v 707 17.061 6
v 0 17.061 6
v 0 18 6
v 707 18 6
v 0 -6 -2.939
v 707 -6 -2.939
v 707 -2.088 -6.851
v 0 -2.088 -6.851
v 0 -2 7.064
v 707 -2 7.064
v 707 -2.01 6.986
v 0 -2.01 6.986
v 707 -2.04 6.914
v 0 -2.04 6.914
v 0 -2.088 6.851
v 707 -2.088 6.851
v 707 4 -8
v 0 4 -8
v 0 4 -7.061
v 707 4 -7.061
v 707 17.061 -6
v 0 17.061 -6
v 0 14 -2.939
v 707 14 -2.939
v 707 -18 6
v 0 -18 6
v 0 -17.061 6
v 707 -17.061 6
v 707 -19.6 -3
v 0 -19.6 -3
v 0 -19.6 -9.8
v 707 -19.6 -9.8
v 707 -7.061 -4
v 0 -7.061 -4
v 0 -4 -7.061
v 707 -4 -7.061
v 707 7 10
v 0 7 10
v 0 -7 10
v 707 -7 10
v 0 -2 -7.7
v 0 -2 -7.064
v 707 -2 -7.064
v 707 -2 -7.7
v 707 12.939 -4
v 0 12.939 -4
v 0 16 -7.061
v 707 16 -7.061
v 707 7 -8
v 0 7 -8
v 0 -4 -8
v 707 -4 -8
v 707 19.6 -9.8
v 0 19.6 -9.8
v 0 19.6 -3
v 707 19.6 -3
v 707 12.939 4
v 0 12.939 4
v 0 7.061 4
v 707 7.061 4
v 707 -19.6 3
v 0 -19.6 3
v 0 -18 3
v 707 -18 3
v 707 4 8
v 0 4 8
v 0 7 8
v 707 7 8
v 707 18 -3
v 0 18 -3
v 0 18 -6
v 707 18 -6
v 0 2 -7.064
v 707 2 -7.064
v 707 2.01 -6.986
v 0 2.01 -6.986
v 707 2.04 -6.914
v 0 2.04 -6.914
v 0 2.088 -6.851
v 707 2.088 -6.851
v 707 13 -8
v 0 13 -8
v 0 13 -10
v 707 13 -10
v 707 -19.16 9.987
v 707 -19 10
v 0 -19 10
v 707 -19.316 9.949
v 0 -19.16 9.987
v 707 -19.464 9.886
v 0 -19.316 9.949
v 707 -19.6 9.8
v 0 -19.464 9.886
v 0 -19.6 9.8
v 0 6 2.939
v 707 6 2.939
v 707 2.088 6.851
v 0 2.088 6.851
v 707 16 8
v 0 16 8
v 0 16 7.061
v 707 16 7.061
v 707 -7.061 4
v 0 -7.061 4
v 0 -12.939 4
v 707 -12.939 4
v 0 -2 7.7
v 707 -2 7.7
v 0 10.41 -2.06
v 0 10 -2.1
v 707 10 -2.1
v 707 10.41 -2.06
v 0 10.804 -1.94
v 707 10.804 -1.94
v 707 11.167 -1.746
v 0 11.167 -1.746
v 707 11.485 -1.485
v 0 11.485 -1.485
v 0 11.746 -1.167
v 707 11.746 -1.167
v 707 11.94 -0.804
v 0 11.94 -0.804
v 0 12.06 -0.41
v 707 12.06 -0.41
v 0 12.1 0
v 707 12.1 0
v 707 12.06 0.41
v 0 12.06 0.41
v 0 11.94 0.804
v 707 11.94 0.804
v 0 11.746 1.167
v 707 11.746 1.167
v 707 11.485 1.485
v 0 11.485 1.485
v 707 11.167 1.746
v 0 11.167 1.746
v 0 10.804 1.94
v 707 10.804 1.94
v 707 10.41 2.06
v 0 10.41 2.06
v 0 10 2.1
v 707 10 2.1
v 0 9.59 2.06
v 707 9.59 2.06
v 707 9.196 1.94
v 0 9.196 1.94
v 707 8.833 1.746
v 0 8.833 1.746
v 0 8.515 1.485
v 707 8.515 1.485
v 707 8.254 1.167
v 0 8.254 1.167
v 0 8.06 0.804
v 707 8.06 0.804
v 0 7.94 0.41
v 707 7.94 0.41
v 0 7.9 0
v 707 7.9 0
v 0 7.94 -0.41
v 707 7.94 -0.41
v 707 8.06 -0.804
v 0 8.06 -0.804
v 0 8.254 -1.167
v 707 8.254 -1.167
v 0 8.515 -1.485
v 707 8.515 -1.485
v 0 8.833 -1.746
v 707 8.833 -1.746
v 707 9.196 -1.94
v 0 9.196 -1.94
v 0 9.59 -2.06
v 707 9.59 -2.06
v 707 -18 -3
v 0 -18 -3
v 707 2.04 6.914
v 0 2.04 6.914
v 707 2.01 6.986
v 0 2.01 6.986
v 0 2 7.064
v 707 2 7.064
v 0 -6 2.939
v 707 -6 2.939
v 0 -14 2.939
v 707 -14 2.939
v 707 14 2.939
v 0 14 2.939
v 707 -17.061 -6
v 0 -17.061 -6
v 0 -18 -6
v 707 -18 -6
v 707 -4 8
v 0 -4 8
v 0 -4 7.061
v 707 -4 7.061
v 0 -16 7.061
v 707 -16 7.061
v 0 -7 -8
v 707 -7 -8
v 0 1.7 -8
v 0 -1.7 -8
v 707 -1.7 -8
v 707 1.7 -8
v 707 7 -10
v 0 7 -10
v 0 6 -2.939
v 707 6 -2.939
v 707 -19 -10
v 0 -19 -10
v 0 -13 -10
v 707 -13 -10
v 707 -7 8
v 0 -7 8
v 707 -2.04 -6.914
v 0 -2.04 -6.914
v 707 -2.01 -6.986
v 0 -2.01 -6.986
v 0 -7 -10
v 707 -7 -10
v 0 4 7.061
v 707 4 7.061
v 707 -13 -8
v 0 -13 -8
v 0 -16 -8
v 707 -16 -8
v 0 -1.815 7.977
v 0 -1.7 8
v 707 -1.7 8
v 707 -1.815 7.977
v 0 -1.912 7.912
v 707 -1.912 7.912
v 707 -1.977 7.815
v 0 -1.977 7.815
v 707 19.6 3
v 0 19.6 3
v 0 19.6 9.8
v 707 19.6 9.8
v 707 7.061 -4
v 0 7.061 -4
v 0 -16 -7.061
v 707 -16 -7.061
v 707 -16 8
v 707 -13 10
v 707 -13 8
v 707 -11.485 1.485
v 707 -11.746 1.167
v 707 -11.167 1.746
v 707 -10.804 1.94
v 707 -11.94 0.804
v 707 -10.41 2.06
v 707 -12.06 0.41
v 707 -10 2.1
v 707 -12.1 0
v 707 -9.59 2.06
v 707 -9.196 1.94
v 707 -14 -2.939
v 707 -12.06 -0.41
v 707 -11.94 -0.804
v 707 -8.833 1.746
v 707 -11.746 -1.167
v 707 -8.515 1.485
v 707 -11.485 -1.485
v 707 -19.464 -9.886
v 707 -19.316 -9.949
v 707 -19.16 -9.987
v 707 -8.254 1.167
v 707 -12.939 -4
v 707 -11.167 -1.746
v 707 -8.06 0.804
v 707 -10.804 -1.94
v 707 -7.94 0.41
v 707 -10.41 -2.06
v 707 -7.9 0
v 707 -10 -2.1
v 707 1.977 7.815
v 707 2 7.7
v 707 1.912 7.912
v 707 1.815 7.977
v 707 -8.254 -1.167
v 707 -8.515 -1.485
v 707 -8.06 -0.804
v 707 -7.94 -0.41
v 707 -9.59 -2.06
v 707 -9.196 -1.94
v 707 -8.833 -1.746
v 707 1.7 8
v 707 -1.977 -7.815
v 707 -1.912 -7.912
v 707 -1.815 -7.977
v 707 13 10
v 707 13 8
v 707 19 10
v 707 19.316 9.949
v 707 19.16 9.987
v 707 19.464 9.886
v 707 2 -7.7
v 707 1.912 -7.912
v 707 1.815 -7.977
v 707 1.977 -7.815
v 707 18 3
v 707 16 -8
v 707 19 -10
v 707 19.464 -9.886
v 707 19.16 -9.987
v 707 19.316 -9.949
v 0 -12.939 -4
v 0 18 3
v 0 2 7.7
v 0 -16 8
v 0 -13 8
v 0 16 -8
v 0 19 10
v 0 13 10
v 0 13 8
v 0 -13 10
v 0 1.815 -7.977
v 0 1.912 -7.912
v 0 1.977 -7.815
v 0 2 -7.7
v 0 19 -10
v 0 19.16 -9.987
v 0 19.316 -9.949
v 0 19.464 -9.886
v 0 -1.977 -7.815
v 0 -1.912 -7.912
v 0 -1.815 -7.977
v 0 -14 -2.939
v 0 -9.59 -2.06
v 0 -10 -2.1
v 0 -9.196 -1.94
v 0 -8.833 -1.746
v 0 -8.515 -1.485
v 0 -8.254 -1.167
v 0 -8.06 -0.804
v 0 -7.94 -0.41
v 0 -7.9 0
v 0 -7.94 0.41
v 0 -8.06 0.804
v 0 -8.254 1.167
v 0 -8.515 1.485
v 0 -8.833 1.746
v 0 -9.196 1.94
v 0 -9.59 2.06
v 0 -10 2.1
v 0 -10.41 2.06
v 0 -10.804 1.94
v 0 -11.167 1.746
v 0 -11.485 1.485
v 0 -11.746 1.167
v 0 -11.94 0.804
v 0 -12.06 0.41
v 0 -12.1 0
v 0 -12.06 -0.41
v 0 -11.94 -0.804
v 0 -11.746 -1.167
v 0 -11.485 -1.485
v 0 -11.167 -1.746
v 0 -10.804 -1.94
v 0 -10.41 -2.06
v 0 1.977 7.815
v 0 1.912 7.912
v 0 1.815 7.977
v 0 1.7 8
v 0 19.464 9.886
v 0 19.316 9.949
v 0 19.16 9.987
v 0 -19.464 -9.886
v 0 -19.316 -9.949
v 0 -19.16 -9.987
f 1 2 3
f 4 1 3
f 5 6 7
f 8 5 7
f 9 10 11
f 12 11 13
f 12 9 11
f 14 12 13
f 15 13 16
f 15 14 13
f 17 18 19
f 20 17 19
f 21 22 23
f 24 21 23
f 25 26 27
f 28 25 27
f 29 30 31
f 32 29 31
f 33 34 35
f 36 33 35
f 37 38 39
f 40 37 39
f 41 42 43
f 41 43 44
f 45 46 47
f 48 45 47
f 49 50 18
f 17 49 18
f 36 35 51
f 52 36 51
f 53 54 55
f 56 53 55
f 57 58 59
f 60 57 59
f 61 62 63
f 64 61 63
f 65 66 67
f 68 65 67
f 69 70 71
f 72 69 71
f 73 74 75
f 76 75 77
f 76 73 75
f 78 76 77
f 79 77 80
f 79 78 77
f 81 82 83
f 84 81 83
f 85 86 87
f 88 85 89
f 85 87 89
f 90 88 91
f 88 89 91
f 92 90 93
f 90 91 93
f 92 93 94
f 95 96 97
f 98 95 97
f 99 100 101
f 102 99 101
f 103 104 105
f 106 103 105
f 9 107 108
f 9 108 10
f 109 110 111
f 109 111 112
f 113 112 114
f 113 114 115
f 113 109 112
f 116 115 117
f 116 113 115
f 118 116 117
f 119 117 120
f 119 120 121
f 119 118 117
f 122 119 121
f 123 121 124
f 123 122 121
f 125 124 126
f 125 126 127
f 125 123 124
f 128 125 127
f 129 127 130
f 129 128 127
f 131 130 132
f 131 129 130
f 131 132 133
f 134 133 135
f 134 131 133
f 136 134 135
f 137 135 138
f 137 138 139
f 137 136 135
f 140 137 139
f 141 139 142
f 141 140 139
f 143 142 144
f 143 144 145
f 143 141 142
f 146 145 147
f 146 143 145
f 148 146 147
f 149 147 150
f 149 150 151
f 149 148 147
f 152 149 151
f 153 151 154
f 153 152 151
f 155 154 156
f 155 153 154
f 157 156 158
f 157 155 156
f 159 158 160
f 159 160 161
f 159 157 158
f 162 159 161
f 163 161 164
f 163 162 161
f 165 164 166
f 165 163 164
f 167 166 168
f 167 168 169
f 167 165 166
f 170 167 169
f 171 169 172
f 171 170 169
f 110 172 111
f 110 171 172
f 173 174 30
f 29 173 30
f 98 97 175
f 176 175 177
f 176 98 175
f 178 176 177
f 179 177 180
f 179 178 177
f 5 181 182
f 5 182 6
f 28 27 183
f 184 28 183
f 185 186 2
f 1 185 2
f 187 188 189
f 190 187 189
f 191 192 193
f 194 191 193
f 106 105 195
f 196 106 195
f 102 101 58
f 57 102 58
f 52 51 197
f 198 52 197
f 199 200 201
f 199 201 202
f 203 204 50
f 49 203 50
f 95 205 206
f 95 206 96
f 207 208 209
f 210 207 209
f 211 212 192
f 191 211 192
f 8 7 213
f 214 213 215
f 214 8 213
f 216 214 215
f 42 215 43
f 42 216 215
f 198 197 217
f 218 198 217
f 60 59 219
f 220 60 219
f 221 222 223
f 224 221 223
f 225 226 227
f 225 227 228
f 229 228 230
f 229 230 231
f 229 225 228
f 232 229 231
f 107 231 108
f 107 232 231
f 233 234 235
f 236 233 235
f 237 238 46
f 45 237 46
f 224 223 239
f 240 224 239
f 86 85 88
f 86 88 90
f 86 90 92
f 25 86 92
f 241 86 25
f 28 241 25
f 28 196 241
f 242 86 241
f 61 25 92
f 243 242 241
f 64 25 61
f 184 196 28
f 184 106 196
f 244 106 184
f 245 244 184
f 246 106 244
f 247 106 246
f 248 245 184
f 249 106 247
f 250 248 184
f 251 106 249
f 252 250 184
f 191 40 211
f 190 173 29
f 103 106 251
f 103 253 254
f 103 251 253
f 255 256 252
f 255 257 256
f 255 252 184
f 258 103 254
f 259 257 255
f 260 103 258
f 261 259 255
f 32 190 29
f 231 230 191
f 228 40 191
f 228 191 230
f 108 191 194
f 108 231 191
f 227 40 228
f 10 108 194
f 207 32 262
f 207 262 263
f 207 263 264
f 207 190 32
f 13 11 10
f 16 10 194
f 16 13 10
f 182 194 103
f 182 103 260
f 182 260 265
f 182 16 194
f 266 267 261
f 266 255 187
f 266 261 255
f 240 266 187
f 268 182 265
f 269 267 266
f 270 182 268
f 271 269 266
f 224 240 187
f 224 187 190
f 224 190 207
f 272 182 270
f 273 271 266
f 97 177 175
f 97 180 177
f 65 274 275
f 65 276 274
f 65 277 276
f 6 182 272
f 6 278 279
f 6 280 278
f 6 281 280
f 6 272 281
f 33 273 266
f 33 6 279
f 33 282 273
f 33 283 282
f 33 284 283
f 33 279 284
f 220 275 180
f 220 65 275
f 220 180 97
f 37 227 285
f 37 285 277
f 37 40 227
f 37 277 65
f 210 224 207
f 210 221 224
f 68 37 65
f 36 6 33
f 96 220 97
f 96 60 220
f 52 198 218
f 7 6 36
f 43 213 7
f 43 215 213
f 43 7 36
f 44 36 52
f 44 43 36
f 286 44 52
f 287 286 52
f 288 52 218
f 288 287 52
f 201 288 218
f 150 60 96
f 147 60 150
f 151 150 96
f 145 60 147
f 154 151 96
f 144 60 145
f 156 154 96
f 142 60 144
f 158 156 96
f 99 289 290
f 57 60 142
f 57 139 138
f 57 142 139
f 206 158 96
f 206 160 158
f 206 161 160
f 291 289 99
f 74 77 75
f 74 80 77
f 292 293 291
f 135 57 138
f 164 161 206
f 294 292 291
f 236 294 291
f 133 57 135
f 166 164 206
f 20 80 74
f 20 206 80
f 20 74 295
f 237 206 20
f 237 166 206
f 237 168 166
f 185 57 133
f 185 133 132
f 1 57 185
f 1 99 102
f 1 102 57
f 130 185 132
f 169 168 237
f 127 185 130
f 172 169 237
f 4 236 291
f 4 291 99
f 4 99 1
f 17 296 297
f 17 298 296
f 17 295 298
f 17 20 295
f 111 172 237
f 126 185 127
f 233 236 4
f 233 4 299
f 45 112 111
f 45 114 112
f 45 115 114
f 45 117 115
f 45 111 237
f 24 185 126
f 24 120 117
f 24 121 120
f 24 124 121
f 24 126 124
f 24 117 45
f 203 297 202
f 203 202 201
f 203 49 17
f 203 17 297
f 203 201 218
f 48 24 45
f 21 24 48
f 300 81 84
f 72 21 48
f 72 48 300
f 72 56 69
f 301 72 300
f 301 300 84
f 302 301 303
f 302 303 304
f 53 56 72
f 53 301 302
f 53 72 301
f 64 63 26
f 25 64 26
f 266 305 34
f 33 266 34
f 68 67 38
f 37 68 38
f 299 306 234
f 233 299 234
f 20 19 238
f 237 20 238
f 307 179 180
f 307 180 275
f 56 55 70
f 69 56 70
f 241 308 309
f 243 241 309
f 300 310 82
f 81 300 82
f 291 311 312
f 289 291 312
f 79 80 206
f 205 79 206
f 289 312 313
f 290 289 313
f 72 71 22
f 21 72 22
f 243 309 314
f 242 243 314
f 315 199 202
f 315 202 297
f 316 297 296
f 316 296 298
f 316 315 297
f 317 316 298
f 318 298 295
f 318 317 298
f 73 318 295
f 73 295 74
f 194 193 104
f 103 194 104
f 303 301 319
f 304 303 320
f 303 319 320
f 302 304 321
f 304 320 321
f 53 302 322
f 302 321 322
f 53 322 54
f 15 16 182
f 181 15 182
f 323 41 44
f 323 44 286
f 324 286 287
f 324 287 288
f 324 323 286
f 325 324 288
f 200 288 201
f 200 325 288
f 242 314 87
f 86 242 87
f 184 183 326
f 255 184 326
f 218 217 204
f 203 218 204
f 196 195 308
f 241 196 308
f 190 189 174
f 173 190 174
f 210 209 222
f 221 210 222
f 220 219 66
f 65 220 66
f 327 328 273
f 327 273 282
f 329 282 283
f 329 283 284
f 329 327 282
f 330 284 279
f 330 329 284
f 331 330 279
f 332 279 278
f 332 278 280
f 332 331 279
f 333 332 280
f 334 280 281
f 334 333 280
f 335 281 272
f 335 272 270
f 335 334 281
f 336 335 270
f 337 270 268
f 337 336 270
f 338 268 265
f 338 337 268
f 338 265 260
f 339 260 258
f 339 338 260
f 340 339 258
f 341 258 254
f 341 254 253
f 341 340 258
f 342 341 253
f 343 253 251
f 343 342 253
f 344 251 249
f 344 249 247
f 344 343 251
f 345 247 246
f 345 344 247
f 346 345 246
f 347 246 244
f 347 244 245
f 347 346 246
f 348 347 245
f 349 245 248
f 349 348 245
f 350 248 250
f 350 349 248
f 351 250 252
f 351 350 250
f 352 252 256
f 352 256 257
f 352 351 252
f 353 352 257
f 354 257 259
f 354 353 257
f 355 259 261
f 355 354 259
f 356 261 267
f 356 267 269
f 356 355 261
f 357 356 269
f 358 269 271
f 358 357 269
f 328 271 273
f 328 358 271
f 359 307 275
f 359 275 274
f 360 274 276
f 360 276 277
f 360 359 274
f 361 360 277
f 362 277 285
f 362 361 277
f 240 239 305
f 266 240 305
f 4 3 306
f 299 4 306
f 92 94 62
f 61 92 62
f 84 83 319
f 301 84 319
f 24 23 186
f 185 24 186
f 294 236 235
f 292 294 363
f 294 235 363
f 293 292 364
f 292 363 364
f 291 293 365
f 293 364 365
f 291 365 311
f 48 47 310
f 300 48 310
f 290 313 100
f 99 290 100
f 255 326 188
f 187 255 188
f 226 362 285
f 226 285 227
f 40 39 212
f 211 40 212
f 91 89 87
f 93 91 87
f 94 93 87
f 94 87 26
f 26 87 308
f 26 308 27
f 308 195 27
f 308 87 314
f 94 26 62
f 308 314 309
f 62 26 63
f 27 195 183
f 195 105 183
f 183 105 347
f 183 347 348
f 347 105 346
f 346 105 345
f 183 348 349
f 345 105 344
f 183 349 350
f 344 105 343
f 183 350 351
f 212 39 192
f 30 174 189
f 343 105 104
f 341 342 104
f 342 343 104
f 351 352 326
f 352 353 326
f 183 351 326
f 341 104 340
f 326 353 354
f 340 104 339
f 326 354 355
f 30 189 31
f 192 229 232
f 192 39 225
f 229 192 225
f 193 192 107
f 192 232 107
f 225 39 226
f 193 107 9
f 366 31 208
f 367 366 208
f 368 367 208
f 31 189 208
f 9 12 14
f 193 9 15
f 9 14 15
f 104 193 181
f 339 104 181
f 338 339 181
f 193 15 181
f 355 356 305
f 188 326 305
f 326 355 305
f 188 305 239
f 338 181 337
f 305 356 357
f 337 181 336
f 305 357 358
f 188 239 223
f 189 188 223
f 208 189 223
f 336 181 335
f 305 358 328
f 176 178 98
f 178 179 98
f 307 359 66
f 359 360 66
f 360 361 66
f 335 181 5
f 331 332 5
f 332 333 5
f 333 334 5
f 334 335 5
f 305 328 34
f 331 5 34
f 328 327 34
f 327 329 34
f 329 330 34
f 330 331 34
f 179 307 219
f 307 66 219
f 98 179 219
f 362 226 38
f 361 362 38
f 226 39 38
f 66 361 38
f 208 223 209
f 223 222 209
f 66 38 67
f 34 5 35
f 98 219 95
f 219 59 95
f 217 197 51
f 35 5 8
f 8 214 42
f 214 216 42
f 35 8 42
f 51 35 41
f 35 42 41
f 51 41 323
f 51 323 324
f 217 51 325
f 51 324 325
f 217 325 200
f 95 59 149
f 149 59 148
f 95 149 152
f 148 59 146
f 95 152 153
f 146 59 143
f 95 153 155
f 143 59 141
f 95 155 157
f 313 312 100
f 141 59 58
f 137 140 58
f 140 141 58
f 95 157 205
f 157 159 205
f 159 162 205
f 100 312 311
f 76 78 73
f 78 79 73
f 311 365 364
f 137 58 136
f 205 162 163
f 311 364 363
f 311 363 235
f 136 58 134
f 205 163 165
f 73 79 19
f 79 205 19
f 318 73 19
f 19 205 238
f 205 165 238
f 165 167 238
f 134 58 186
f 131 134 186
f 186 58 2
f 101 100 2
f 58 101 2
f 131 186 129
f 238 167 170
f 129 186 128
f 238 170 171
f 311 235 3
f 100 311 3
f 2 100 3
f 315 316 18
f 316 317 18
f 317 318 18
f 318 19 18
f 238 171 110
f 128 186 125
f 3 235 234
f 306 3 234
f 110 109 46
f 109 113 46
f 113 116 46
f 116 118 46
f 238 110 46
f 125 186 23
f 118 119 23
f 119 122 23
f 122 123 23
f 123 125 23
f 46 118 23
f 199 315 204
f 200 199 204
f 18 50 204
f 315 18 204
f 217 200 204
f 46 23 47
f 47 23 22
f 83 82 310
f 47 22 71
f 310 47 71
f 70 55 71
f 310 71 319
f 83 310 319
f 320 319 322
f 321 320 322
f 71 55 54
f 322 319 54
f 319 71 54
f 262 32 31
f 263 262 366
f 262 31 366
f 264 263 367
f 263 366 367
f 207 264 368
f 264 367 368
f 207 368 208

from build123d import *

# Parameters (mm, degrees)
SKETCH1_R           = 2.1
BOSS_EXTRUDE1_DEPTH = 707


with BuildPart() as part:
    # Sketch1 → Boss-Extrude1 (new body)
    with BuildSketch(Plane(origin=(0, 0, 0), x_dir=(0, 0, -1), z_dir=(1, 0, 0))):
        with BuildLine():
            Line((-10, 7), (-10, -7))
            Line((-10, -7), (-8, -7))
            Line((-8, -7), (-8, -4))
            Line((-8, -4), (-7.060660172, -4))
            Line((-7.060660172, -4), (-4, -7.060660172))
            Line((-4, -7.060660172), (-4, -12.939339828))
            Line((-4, -12.939339828), (-7.060660172, -16))
            Line((-7.060660172, -16), (-8, -16))
            Line((-8, -16), (-8, -13))
            Line((-8, -13), (-10, -13))
            Line((-10, -13), (-10, -19))
            ThreePointArc((-10, -19), (-9.948683298, -19.316227766), (-9.8, -19.6))
            Line((-9.8, -19.6), (-3, -19.6))
            Line((-3, -19.6), (-3, -18))
            Line((-3, -18), (-6, -18))
            Line((-6, -18), (-6, -17.060660172))
            Line((-6, -17.060660172), (-2.939339828, -14))
            Line((-2.939339828, -14), (2.939339828, -14))
            Line((2.939339828, -14), (6, -17.060660172))
            Line((6, -17.060660172), (6, -18))
            Line((6, -18), (3, -18))
            Line((3, -18), (3, -19.6))
            Line((3, -19.6), (9.8, -19.6))
            ThreePointArc((9.8, -19.6), (9.948683298, -19.316227766), (10, -19))
            Line((10, -19), (10, -13))
            Line((10, -13), (8, -13))
            Line((8, -13), (8, -16))
            Line((8, -16), (7.060660172, -16))
            Line((7.060660172, -16), (4, -12.939339828))
            Line((4, -12.939339828), (4, -7.060660172))
            Line((4, -7.060660172), (7.060660172, -4))
            Line((7.060660172, -4), (8, -4))
            Line((8, -4), (8, -7))
            Line((8, -7), (10, -7))
            Line((10, -7), (10, 7))
            Line((10, 7), (8, 7))
            Line((8, 7), (8, 4))
            Line((8, 4), (7.060660172, 4))
            Line((7.060660172, 4), (4, 7.060660172))
            Line((4, 7.060660172), (4, 12.939339828))
            Line((4, 12.939339828), (7.060660172, 16))
            Line((7.060660172, 16), (8, 16))
            Line((8, 16), (8, 13))
            Line((8, 13), (10, 13))
            Line((10, 13), (10, 19))
            ThreePointArc((10, 19), (9.948683298, 19.316227766), (9.8, 19.6))
            Line((9.8, 19.6), (3, 19.6))
            Line((3, 19.6), (3, 18))
            Line((3, 18), (6, 18))
            Line((6, 18), (6, 17.060660172))
            Line((6, 17.060660172), (2.939339828, 14))
            Line((2.939339828, 14), (-2.939339828, 14))
            Line((-2.939339828, 14), (-6, 17.060660172))
            Line((-6, 17.060660172), (-6, 18))
            Line((-6, 18), (-3, 18))
            Line((-3, 18), (-3, 19.6))
            Line((-3, 19.6), (-9.8, 19.6))
            ThreePointArc((-9.8, 19.6), (-9.948683298, 19.316227766), (-10, 19))
            Line((-10, 19), (-10, 13))
            Line((-10, 13), (-8, 13))
            Line((-8, 13), (-8, 16))
            Line((-8, 16), (-7.060660172, 16))
            Line((-7.060660172, 16), (-4, 12.939339828))
            Line((-4, 12.939339828), (-4, 7.060660172))
            Line((-4, 7.060660172), (-7.060660172, 4))
            Line((-7.060660172, 4), (-8, 4))
            Line((-8, 4), (-8, 7))
            Line((-8, 7), (-10, 7))
        make_face()
        with Locations((0, 10)):
            Circle(SKETCH1_R, mode=Mode.SUBTRACT)
        with Locations((0, -10)):
            Circle(SKETCH1_R, mode=Mode.SUBTRACT)
        with BuildLine():
            Line((-8, 1.7), (-8, -1.7))
            ThreePointArc((-8, -1.7), (-7.912132034, -1.912132034), (-7.7, -2))
            Line((-7.7, -2), (-7.063603897, -2))
            ThreePointArc((-7.063603897, -2), (-6.948798867, -2.02283614), (-6.851471863, -2.087867966))
            Line((-6.851471863, -2.087867966), (-2.939339828, -6))
            Line((-2.939339828, -6), (2.939339828, -6))
            Line((2.939339828, -6), (6.851471863, -2.087867966))
            ThreePointArc((6.851471863, -2.087867966), (6.948798867, -2.02283614), (7.063603897, -2))
            Line((7.063603897, -2), (7.7, -2))
            ThreePointArc((7.7, -2), (7.912132034, -1.912132034), (8, -1.7))
            Line((8, -1.7), (8, 1.7))
            ThreePointArc((8, 1.7), (7.912132034, 1.912132034), (7.7, 2))
            Line((7.7, 2), (7.063603897, 2))
            ThreePointArc((7.063603897, 2), (6.948798867, 2.02283614), (6.851471863, 2.087867966))
            Line((6.851471863, 2.087867966), (2.939339828, 6))
            Line((2.939339828, 6), (-2.939339828, 6))
            Line((-2.939339828, 6), (-6.851471863, 2.087867966))
            ThreePointArc((-6.851471863, 2.087867966), (-6.948798867, 2.02283614), (-7.063603897, 2))
            Line((-7.063603897, 2), (-7.7, 2))
            ThreePointArc((-7.7, 2), (-7.912132034, 1.912132034), (-8, 1.7))
        make_face(mode=Mode.SUBTRACT)
    extrude(amount=BOSS_EXTRUDE1_DEPTH)


solid = part.part
